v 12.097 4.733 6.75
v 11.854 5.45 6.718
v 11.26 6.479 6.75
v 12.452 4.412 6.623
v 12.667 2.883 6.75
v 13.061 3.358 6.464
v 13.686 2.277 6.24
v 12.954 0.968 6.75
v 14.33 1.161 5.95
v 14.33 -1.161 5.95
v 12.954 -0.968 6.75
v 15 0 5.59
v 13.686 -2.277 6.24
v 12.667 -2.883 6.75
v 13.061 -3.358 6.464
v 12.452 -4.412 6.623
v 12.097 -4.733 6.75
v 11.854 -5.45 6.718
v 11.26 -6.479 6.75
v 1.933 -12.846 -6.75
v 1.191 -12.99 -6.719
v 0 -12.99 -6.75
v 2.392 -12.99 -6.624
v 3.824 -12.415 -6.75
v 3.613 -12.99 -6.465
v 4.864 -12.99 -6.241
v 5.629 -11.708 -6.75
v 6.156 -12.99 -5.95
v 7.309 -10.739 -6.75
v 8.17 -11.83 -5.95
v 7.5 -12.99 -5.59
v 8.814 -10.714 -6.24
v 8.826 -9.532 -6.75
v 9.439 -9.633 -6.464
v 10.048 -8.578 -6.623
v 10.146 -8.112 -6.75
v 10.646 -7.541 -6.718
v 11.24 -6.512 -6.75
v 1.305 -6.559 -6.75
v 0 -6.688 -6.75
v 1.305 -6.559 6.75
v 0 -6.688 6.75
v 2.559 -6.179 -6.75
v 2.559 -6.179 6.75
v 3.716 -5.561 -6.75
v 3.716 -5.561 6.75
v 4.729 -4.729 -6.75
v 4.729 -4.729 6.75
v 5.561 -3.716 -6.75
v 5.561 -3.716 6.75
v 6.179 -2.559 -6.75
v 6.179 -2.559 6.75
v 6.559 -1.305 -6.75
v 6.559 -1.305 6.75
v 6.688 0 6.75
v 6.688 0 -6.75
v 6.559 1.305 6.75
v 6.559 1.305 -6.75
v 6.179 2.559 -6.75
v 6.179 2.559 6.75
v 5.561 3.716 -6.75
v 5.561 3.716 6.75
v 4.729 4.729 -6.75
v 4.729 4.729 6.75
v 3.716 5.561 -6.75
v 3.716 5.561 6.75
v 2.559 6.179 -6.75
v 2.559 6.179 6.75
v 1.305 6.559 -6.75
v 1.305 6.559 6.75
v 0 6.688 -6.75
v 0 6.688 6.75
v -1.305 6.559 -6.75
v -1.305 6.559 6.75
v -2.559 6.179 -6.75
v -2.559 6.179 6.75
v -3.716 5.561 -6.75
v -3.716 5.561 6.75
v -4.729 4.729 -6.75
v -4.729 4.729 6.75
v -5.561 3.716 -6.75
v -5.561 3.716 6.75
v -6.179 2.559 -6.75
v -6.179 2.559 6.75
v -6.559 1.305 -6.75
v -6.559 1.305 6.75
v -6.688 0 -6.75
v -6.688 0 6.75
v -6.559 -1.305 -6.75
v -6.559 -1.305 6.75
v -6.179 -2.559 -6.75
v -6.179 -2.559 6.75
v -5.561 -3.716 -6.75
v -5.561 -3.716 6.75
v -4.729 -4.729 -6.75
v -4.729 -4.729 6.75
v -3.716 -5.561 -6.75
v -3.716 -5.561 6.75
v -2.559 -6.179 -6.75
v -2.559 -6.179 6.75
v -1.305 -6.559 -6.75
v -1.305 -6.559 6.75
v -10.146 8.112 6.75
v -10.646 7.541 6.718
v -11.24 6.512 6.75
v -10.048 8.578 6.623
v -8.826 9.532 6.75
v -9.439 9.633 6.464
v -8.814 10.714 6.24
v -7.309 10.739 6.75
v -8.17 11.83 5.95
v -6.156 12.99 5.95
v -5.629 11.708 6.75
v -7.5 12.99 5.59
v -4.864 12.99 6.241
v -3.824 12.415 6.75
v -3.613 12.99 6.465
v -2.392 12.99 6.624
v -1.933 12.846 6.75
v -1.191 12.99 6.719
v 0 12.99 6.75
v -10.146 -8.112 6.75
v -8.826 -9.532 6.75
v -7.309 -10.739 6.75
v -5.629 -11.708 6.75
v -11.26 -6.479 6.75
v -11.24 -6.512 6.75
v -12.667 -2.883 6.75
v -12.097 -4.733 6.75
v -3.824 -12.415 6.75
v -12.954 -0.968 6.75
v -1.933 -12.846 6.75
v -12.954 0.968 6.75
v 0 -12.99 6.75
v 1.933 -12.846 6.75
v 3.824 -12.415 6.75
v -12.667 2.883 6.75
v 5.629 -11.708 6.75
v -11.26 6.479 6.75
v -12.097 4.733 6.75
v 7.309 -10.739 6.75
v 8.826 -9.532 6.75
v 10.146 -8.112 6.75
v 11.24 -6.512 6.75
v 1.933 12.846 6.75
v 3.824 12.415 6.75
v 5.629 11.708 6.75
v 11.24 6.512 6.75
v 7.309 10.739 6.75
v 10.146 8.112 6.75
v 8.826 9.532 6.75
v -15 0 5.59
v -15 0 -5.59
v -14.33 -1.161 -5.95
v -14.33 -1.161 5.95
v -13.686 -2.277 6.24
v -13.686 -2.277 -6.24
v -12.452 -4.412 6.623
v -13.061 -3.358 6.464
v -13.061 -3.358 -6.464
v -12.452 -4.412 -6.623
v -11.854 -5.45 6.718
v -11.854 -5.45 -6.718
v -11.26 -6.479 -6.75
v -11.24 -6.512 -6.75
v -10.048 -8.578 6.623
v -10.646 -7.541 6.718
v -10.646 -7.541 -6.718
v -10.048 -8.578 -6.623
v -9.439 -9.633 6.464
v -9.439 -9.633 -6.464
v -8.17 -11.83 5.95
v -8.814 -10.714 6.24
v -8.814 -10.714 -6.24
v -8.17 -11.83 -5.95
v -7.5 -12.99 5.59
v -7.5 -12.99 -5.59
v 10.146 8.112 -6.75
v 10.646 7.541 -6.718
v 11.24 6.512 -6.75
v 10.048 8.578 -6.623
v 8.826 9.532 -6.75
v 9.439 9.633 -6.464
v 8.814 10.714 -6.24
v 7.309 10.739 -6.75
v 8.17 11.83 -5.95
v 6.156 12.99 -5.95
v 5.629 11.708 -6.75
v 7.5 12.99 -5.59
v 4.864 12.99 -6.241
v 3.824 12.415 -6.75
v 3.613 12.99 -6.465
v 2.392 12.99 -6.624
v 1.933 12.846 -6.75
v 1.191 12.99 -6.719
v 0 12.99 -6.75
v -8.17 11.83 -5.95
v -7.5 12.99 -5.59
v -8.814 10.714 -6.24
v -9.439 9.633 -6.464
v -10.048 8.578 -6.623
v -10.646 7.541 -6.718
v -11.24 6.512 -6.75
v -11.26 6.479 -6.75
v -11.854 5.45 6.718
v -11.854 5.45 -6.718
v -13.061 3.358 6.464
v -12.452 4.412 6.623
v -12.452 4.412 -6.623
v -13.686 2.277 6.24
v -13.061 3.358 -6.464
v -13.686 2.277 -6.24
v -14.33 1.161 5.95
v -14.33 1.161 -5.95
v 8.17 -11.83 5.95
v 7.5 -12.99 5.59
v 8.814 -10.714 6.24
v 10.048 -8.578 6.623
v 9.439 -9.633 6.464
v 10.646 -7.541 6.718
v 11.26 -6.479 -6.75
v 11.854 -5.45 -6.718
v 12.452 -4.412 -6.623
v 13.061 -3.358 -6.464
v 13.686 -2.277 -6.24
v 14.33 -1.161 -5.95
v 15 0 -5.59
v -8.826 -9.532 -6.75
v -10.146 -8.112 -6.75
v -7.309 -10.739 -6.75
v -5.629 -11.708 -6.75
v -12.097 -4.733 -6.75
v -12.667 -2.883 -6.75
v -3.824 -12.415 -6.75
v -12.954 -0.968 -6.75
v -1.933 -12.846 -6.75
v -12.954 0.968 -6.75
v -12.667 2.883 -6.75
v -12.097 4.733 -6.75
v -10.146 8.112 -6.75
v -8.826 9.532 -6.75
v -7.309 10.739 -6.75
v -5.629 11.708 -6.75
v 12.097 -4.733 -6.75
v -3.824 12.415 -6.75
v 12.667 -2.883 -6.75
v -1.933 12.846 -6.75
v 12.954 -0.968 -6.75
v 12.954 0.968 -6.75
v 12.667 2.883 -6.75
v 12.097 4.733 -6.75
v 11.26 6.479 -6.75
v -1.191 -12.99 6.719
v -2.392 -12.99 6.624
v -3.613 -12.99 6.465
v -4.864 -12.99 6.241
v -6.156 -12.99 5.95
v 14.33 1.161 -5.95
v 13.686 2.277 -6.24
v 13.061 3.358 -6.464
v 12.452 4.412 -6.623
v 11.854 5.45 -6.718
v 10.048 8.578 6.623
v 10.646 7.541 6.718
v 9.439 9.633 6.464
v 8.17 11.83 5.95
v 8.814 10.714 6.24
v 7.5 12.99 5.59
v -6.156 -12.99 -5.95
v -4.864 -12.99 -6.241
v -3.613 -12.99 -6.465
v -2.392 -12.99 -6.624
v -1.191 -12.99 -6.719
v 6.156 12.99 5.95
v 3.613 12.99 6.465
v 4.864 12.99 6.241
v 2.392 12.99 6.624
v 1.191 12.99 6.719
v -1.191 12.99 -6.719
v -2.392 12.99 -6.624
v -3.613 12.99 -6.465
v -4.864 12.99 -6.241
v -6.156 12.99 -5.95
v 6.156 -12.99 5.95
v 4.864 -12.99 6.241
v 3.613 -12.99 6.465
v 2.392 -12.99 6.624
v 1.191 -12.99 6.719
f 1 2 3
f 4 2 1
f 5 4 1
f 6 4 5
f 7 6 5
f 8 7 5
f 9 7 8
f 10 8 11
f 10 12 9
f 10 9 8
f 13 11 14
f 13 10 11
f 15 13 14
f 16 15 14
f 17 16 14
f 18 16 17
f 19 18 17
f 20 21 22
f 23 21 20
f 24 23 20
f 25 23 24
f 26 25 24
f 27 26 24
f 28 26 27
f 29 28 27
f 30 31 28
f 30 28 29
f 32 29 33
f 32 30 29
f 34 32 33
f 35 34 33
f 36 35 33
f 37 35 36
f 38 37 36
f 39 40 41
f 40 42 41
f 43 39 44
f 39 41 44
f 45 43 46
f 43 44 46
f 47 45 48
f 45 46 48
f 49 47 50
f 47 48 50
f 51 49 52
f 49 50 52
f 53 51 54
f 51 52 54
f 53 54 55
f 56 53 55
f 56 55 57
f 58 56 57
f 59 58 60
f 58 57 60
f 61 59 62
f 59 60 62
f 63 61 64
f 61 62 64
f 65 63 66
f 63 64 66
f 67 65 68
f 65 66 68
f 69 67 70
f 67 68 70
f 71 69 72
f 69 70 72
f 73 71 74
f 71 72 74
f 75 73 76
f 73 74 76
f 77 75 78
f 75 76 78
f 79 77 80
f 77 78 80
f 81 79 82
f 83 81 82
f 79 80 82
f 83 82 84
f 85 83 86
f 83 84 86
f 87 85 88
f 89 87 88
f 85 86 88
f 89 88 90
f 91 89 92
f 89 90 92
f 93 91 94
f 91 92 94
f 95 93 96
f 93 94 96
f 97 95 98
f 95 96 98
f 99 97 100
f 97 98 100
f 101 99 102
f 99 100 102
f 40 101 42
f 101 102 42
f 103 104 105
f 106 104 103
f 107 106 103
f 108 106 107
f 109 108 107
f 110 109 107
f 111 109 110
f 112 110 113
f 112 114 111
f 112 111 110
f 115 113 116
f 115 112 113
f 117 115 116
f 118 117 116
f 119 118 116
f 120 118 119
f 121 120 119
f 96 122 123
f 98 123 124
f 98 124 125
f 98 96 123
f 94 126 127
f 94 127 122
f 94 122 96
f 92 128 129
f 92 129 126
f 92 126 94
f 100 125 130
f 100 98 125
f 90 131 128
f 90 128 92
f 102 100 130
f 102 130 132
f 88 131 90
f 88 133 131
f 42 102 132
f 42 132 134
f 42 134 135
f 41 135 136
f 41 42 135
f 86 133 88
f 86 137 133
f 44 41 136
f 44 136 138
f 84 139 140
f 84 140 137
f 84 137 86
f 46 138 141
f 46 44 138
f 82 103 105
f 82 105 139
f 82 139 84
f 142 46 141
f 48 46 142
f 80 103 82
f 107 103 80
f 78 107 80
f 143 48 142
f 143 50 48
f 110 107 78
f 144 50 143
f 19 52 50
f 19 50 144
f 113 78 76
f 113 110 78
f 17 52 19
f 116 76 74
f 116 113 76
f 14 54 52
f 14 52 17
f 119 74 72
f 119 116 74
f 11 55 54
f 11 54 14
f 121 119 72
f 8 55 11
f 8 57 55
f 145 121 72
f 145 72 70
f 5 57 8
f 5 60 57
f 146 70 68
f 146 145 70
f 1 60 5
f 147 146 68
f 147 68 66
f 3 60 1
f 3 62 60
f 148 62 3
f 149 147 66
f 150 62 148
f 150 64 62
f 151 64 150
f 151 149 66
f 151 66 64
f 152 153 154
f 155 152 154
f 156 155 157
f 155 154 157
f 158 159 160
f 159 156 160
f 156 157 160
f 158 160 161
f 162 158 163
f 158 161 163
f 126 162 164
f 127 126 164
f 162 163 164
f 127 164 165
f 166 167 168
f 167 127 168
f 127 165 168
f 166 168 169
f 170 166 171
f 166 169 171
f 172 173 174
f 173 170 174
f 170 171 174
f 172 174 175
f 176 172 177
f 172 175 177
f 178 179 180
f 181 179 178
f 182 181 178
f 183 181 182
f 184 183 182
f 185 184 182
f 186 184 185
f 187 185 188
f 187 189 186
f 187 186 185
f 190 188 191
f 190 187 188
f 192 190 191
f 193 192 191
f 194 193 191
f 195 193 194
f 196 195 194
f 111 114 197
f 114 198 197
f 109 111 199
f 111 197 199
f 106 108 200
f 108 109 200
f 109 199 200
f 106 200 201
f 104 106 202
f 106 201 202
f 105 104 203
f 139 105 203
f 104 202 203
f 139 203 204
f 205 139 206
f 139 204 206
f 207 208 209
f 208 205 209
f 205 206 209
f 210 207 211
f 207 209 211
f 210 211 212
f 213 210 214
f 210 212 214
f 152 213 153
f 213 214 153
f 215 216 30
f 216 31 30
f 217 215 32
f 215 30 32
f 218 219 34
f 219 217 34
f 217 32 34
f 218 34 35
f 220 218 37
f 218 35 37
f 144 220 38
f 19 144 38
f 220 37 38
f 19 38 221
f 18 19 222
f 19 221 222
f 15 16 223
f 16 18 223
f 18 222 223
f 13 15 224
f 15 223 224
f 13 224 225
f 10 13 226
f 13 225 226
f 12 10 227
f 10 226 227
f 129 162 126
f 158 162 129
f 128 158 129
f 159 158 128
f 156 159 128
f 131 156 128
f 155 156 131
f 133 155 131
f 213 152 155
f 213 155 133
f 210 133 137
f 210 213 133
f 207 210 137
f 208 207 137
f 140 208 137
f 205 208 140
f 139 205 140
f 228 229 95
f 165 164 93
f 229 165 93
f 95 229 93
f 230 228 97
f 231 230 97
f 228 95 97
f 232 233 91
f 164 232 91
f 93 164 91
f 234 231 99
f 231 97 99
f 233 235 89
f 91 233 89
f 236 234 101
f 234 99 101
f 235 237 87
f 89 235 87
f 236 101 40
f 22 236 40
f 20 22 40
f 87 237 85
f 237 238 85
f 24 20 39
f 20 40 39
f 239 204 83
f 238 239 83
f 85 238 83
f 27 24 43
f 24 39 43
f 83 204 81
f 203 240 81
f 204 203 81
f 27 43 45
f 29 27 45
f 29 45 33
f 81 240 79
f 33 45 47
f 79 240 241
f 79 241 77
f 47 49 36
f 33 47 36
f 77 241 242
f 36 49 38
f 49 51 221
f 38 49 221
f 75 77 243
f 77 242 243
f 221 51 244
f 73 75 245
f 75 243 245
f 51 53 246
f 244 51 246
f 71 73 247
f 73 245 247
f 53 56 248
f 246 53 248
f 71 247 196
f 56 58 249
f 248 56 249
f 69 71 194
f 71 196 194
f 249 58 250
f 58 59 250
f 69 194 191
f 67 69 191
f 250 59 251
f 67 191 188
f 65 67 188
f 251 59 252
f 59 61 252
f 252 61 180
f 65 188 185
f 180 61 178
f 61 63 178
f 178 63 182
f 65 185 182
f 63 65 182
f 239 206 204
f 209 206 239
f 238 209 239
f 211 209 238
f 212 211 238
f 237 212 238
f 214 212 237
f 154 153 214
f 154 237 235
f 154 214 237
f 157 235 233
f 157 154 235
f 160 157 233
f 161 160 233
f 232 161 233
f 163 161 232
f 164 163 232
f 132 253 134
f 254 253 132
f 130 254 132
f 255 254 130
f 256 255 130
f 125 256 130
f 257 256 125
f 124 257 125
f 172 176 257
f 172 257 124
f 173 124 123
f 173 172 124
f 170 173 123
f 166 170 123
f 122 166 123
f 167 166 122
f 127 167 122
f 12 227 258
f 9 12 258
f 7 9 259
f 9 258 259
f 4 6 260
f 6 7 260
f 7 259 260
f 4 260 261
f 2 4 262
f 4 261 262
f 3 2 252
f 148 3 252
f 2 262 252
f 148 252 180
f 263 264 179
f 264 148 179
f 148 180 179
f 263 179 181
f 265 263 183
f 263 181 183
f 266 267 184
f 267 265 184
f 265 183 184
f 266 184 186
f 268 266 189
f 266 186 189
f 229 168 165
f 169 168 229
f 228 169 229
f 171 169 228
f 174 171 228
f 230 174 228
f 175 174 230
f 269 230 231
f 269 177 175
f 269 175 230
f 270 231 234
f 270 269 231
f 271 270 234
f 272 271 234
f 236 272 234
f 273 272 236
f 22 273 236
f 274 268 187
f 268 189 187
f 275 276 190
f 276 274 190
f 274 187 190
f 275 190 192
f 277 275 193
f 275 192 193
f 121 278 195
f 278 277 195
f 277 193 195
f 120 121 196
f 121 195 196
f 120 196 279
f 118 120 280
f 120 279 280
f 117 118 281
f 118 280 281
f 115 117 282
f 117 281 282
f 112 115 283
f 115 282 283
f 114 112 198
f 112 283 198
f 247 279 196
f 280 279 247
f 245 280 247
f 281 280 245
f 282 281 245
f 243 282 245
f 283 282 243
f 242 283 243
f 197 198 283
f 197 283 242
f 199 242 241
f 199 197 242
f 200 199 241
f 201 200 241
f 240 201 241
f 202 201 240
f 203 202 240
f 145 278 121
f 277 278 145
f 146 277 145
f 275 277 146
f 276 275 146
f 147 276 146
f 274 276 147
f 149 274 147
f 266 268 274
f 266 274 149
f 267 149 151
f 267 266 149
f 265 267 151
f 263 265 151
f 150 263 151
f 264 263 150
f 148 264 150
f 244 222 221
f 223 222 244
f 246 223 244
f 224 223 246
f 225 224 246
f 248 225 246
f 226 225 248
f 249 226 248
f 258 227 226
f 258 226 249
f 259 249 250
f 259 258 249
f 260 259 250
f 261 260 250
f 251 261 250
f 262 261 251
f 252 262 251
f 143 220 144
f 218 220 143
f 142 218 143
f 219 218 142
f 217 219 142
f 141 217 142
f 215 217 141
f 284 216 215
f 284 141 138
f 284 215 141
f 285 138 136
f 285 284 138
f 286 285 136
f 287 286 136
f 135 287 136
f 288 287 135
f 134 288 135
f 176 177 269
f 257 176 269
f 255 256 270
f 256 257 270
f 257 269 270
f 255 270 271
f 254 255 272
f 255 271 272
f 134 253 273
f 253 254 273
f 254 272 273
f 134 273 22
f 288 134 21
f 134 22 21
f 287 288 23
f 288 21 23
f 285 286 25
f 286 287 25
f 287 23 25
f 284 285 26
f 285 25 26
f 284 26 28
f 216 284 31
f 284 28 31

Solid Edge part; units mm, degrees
sketch "Sketch1" plane through (0, 0, 0) normal (0, 0, 1) x (1, 0, 0)
  line L0 (-7.5, -12.9904) -> (7.5, -12.9904)
  line L1 (7.5, -12.9904) -> (15, 0)
  line L2 (15, 0) -> (7.5, 12.9904)
  line L3 (7.5, 12.9904) -> (-7.5, 12.9904)
  line L4 (-7.5, 12.9904) -> (-15, 0)
  line L5 (-15, 0) -> (-7.5, -12.9904)
extrude "Protrusion1" add sketch "Sketch1" along normal mid plane 13.5
sketch "Sketch2" plane through (0, 0, 0) normal (1, 0, 0) x (0, 1, 0)
  line L0 (12.9904, -6.75) -> (34.5982, 5.7253)
revolve "RevolvedCutout1" cut sketch "Sketch2" angle 360 about axis through (0, 0, -57) along (0, 0, 1) material side at (0, 23.8193, -0.5557)
mirror "Mirror1" about plane through (0, 0, 0) normal (0, 0, 1) of "RevolvedCutout1"
hole "Hole_1" at (0, 0, 6.75) direction (0, 0, -1) diameter 13.376 end through all
properties part number "5" material "Fe - 410 W"
